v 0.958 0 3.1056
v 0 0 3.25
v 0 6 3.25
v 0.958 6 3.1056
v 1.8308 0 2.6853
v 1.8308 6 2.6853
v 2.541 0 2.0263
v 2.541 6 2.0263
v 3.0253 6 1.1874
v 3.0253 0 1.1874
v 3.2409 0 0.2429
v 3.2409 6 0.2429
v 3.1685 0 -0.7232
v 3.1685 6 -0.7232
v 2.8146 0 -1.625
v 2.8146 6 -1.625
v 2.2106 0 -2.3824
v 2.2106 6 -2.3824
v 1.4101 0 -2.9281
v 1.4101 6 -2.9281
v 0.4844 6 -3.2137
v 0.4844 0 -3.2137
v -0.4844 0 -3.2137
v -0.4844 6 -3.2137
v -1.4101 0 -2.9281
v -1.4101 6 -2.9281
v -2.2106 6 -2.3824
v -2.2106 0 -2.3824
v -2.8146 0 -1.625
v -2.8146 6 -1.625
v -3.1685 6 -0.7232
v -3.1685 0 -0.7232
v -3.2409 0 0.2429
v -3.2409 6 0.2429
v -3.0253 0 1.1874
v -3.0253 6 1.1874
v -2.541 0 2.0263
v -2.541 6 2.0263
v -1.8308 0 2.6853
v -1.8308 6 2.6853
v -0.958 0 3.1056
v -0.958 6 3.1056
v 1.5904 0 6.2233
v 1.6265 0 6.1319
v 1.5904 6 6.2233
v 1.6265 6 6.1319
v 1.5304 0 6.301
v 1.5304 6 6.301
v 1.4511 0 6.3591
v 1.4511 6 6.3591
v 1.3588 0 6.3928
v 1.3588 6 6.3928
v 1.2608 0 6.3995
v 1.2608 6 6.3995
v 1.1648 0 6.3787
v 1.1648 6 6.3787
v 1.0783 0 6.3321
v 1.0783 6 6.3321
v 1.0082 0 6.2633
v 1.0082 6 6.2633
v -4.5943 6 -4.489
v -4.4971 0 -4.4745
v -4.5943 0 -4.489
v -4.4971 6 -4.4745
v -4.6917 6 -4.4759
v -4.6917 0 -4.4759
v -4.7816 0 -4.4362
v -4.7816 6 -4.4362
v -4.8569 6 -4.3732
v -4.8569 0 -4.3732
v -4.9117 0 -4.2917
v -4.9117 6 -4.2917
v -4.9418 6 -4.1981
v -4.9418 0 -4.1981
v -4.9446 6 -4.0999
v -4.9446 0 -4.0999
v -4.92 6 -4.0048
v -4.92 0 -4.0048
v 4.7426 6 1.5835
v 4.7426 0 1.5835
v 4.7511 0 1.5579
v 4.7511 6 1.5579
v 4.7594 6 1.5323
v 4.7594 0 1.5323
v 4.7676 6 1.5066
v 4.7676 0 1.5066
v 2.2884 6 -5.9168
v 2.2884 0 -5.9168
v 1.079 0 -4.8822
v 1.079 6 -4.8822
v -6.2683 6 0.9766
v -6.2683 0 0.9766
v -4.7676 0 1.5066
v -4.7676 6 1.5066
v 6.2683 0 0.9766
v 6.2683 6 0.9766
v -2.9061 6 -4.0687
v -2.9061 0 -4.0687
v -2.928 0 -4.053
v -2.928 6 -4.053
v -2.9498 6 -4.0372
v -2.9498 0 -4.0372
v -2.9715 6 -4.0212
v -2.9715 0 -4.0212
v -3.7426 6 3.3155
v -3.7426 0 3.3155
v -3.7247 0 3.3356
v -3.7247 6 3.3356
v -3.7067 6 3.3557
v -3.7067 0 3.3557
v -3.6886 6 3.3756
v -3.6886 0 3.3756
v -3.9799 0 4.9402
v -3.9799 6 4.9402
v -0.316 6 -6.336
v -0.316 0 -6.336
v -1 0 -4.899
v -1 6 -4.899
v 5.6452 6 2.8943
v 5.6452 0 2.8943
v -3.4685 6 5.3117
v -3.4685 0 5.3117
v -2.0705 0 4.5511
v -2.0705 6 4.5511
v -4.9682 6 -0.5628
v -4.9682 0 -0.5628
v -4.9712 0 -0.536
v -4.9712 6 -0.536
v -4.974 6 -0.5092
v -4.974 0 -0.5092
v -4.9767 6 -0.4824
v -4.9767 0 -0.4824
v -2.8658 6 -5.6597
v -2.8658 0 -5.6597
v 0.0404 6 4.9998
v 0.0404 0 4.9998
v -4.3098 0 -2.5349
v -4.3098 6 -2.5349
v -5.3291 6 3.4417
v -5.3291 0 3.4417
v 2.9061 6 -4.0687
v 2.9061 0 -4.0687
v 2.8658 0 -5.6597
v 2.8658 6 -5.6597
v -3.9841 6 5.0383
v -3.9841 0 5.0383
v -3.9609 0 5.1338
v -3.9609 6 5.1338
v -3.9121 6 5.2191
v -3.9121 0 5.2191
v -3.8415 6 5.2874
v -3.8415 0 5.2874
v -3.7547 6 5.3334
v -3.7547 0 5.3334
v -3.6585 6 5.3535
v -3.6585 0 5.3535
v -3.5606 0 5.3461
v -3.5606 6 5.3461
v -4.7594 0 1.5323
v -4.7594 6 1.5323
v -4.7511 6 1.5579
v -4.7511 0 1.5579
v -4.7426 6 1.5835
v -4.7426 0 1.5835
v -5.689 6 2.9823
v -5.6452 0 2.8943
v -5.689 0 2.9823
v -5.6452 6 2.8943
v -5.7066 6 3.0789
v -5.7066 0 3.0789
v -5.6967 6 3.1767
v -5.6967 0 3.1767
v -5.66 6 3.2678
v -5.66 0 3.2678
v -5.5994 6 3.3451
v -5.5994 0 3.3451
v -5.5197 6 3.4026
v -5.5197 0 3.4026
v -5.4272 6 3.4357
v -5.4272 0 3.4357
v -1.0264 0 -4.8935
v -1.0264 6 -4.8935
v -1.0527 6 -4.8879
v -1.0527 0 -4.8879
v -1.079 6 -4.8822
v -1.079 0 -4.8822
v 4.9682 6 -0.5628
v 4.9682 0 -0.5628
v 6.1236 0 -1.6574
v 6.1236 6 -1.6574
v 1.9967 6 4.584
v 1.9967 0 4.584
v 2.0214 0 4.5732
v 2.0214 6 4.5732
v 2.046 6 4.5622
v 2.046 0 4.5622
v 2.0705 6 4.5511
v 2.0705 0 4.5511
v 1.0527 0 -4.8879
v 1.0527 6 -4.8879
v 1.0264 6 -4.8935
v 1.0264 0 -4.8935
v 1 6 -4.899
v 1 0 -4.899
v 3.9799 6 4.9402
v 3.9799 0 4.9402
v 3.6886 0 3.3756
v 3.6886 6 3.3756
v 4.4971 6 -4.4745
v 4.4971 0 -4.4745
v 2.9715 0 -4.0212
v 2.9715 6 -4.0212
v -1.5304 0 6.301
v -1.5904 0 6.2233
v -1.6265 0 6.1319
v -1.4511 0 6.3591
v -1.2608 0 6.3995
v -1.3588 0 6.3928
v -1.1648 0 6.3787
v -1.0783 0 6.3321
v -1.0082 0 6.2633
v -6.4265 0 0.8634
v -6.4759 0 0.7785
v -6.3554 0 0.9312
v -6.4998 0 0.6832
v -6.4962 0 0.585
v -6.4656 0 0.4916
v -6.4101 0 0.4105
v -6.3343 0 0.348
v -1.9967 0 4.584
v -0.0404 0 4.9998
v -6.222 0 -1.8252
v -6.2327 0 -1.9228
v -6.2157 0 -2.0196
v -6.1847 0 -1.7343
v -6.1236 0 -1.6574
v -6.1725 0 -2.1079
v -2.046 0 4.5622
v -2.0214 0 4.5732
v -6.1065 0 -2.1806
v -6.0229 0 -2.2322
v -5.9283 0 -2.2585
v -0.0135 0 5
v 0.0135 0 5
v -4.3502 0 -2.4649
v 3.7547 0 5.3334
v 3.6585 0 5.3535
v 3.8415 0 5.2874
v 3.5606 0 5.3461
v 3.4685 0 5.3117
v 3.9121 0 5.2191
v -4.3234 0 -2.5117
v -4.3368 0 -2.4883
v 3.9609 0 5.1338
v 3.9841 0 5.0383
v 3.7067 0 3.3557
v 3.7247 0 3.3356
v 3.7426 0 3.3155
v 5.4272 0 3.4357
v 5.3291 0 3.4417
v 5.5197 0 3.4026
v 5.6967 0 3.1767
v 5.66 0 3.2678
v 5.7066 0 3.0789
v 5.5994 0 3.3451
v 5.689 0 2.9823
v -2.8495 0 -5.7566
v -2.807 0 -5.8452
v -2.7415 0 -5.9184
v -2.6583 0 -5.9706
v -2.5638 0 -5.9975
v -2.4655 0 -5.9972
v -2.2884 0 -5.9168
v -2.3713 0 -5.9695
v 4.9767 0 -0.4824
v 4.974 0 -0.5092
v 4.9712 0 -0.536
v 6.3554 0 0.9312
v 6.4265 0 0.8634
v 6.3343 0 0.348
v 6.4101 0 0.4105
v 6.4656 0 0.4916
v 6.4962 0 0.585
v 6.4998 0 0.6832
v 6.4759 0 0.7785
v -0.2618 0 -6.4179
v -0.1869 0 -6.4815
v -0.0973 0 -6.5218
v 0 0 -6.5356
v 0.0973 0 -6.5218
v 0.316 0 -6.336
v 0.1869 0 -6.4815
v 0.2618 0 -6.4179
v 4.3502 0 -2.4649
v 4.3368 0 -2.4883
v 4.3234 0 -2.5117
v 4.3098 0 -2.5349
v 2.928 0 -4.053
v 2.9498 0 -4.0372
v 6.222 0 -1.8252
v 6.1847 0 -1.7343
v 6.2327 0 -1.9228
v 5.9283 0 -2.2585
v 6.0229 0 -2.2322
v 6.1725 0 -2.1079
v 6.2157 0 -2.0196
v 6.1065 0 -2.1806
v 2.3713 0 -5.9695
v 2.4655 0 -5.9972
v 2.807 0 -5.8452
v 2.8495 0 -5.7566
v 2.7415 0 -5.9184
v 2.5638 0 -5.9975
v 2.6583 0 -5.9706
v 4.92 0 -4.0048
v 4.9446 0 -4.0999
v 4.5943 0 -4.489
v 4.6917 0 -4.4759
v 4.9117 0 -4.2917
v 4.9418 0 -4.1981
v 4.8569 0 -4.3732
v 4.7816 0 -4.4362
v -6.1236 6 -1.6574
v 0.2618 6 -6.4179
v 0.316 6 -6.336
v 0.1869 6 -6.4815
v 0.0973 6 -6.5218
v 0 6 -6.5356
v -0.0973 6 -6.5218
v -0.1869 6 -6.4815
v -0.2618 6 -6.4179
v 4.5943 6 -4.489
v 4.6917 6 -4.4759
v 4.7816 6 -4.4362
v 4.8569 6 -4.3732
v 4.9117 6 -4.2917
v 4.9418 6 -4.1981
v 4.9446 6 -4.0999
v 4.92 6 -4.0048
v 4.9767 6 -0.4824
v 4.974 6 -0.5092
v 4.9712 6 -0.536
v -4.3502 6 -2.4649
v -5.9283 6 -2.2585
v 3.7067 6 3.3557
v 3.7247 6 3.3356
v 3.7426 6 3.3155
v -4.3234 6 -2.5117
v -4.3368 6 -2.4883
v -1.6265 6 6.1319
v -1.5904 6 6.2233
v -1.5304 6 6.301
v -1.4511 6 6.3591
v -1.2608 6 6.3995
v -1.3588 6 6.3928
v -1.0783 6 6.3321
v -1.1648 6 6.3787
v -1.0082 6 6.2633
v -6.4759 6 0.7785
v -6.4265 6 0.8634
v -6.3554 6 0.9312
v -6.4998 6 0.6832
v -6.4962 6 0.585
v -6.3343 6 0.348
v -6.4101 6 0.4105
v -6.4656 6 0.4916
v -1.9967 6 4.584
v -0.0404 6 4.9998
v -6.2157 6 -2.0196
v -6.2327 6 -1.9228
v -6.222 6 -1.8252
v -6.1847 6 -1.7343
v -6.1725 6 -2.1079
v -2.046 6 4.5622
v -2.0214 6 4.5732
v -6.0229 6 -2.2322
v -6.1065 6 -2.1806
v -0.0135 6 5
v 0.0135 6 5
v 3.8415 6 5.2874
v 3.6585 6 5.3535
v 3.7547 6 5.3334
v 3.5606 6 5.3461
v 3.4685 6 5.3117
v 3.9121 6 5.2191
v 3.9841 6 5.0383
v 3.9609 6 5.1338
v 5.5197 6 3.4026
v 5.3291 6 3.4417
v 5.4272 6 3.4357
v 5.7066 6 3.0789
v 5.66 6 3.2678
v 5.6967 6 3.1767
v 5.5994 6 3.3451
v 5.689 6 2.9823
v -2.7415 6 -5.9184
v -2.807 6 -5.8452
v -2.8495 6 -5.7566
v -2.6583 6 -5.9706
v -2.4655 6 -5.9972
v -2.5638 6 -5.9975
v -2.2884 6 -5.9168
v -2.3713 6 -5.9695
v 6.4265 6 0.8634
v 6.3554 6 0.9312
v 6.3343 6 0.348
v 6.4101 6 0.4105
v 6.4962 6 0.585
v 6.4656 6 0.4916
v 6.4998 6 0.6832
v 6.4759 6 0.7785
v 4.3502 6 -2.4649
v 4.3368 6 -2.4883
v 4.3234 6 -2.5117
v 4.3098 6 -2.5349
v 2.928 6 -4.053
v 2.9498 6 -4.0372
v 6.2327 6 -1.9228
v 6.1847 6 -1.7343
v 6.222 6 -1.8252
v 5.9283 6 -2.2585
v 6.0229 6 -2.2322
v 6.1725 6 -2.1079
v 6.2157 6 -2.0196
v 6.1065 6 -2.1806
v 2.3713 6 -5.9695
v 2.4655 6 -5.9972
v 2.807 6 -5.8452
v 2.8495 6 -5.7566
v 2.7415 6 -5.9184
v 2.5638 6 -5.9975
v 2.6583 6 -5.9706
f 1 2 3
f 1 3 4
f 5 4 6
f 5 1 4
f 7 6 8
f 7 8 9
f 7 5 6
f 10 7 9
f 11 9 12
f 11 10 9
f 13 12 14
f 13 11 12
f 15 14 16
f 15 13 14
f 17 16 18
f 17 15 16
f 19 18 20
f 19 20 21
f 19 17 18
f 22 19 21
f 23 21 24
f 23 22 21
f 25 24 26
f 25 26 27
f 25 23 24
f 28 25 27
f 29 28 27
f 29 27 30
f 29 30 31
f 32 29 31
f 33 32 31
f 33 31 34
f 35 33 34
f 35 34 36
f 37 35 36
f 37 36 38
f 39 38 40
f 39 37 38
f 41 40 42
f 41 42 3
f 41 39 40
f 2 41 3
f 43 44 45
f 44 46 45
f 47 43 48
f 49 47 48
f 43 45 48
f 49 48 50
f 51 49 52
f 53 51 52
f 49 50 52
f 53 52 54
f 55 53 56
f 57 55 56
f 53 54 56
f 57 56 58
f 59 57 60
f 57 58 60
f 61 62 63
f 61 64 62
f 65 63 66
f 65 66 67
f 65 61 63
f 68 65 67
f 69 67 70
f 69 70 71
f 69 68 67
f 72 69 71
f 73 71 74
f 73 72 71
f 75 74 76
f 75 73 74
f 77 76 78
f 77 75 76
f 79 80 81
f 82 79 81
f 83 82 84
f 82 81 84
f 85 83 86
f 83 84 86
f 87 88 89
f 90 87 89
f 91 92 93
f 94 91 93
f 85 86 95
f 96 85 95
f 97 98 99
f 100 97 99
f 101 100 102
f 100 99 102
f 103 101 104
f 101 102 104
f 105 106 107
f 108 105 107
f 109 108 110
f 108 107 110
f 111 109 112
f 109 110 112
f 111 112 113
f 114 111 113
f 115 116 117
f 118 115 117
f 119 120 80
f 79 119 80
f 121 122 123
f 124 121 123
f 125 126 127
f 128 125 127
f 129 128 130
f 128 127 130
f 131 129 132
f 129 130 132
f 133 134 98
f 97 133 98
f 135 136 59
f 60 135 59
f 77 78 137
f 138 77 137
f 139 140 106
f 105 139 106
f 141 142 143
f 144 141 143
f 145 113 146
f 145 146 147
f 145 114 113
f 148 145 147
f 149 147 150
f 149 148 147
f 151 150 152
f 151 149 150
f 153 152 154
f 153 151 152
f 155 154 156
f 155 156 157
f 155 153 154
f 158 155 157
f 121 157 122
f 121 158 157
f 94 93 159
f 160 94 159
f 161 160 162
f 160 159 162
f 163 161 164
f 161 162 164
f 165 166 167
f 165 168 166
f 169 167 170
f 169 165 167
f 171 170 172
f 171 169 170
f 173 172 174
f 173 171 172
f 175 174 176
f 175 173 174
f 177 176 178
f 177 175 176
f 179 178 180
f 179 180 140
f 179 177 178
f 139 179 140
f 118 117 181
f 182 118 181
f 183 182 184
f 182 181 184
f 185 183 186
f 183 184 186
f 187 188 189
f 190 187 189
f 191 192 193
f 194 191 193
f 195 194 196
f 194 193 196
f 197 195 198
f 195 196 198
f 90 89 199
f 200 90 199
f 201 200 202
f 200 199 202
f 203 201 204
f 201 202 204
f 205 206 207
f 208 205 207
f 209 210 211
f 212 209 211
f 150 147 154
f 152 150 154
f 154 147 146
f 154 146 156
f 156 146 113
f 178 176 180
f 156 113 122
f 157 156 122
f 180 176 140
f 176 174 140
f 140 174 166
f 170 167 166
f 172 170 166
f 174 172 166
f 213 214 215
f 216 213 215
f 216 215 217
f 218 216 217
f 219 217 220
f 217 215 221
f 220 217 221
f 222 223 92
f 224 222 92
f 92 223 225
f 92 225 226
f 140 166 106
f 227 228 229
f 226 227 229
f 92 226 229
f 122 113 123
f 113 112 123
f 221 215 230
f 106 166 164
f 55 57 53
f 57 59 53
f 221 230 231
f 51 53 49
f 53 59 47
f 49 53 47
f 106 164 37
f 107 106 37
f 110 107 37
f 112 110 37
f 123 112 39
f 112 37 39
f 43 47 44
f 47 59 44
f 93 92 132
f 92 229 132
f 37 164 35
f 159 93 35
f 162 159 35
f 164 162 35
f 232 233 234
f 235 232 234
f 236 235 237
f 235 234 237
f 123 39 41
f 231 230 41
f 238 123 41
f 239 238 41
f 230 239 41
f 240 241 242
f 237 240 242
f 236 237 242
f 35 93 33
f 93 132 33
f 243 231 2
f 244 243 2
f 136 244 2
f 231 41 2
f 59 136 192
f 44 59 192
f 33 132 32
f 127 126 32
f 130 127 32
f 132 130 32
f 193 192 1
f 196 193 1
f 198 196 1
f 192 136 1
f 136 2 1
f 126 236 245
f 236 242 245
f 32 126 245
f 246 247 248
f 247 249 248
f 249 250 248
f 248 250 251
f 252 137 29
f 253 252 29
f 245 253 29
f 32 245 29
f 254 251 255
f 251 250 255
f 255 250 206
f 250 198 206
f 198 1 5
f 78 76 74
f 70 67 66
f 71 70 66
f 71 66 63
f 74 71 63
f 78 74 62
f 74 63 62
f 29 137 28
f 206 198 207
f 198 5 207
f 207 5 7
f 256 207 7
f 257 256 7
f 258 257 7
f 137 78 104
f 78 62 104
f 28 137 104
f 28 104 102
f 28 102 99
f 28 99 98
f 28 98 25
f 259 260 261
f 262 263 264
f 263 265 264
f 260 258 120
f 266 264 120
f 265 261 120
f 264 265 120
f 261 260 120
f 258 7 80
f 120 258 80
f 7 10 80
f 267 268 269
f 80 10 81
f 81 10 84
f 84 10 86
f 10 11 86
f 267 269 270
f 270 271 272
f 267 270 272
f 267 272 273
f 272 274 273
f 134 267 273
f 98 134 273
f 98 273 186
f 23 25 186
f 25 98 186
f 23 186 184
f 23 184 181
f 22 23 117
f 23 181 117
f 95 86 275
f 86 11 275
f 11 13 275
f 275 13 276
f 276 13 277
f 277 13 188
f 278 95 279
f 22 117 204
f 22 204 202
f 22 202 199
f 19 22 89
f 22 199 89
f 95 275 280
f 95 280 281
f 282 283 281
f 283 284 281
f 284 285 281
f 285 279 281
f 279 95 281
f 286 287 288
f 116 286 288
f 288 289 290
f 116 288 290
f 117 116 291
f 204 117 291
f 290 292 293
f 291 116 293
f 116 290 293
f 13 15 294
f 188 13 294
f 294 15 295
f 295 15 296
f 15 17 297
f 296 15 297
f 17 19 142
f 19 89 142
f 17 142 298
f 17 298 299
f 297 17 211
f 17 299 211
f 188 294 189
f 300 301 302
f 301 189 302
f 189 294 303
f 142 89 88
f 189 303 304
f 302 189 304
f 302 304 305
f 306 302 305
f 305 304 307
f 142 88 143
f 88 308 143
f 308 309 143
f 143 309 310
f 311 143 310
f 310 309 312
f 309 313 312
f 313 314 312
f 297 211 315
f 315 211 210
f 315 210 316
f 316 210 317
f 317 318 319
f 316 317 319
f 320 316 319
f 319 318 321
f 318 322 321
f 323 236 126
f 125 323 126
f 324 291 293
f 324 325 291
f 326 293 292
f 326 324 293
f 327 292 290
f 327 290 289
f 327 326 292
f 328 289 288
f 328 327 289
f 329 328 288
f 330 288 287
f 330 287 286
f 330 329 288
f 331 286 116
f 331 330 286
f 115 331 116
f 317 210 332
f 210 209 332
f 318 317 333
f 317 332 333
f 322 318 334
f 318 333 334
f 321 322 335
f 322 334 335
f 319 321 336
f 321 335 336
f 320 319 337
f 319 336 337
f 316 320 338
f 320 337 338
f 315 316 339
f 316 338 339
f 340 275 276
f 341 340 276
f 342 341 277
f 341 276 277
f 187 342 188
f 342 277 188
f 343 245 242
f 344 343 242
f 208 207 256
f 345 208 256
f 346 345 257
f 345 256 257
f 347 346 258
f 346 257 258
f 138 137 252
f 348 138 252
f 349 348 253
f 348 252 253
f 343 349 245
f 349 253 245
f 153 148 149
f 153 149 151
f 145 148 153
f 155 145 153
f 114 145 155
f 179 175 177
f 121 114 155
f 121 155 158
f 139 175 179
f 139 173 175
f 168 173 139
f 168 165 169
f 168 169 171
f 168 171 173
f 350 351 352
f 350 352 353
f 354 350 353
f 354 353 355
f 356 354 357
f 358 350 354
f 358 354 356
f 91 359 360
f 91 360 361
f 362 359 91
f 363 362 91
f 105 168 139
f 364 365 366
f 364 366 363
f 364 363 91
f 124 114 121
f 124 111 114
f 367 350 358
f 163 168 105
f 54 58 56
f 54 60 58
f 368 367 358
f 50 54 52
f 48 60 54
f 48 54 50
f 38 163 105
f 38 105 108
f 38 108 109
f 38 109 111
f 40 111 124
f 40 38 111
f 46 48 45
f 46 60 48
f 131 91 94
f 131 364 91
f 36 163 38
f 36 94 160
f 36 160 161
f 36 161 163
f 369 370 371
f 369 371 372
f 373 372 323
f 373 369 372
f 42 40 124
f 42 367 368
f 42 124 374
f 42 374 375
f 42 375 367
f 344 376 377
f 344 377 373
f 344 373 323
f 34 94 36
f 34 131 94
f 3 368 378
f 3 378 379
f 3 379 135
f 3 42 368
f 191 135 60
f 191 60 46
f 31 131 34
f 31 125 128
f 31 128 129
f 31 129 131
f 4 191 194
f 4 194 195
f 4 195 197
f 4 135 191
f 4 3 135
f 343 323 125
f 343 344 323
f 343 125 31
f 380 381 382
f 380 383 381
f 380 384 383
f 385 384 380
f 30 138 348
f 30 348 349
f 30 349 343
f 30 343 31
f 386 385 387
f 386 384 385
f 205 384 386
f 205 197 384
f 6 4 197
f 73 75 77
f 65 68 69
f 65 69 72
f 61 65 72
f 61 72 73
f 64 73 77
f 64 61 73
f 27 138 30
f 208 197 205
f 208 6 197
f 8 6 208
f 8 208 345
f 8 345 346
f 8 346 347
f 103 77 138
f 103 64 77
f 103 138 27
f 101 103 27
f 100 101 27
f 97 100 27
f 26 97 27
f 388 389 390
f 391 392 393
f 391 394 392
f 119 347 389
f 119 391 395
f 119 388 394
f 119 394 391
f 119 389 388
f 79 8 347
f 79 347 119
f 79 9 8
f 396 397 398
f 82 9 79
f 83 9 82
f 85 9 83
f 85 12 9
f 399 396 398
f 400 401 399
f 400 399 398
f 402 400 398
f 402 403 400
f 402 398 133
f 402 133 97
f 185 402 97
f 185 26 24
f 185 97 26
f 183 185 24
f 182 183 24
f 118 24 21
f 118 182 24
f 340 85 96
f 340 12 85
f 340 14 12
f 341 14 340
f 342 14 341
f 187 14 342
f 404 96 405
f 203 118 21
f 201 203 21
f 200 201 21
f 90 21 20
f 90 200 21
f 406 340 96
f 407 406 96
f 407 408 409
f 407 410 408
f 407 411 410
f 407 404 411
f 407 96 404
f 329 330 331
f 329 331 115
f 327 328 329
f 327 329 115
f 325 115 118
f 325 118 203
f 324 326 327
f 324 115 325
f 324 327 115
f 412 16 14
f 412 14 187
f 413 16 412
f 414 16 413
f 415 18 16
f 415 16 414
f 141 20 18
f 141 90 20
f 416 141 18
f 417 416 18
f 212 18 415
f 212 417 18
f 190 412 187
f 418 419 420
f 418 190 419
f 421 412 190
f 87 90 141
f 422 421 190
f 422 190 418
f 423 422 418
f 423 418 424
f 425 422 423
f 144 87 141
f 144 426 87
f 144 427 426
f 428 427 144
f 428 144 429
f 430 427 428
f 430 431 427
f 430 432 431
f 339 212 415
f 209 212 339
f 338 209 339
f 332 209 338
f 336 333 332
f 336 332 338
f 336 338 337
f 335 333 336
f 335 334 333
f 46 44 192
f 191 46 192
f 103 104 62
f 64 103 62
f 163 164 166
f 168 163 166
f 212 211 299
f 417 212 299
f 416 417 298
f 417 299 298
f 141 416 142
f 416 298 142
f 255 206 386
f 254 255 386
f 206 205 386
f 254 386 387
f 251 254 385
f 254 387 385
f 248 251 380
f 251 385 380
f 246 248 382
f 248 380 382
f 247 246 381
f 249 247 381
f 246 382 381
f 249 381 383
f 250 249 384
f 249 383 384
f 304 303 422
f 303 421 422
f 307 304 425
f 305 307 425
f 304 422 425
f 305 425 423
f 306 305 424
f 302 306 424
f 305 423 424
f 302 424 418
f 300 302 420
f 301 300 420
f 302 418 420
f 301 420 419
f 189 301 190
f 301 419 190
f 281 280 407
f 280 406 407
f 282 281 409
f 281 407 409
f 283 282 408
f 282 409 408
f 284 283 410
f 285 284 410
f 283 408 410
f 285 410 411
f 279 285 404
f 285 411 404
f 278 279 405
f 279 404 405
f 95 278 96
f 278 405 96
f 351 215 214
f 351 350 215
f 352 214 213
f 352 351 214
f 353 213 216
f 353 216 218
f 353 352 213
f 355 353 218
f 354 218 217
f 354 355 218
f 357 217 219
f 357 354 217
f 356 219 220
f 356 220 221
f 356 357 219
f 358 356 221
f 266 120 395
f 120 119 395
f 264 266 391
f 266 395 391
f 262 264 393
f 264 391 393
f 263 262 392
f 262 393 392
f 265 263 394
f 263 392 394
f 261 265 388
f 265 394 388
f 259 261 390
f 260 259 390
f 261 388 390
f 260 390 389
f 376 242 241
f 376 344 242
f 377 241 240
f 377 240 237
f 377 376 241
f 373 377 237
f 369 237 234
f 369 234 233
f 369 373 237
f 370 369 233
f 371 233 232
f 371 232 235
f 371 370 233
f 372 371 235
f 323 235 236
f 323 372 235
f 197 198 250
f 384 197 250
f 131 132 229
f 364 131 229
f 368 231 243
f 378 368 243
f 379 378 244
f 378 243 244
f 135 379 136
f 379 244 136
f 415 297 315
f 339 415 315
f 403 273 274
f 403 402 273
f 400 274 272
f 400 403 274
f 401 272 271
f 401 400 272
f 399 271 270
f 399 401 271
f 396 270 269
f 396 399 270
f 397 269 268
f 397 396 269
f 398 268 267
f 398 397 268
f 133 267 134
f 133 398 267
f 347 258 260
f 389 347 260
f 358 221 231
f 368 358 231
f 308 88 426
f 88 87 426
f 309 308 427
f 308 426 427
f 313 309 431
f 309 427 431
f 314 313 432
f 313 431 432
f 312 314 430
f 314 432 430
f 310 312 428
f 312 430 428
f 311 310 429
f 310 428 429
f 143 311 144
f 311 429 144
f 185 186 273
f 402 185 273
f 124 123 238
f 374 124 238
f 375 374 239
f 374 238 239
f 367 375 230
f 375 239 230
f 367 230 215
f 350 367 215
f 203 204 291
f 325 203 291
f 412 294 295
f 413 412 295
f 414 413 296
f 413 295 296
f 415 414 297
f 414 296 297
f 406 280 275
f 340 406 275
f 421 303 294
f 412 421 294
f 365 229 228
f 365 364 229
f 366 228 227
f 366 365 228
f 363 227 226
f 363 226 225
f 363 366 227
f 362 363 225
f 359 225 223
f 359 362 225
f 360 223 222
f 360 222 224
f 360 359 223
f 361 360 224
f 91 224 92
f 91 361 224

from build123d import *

# Parameters (mm, degrees)
SKETCH1_R           = 3.25
BOSS_EXTRUDE2_DEPTH = 6
FILLET1_R           = 0.35


with BuildPart() as part:
    # Sketch1 → Boss-Extrude2 (new body)
    with BuildSketch(Plane(origin=(0, 0, 0), x_dir=(1, 0, 0), z_dir=(0, 1, 0))):
        with BuildLine():
            Line((1, 4.898979486), (0, 7))
            Line((0, 7), (-1, 4.898979486))
            ThreePointArc((-1, 4.898979486), (-1.039558454, 4.890738004), (-1.079049013, 4.882177099))
            Line((-1.079049013, 4.882177099), (-2.847156502, 6.394818203))
            Line((-2.847156502, 6.394818203), (-2.906139928, 4.068703813))
            ThreePointArc((-2.906139928, 4.068703813), (-2.938926261, 4.045084972), (-2.971520648, 4.021201939))
            Line((-2.971520648, 4.021201939), (-5.202013778, 4.683914245))
            Line((-5.202013778, 4.683914245), (-4.309781861, 2.534912288))
            ThreePointArc((-4.309781861, 2.534912288), (-4.330127019, 2.5), (-4.350189369, 2.464924432))
            Line((-4.350189369, 2.464924432), (-6.657395614, 2.163118961))
            Line((-6.657395614, 2.163118961), (-4.968223357, 0.5628114))
            ThreePointArc((-4.968223357, 0.5628114), (-4.972609477, 0.522642316), (-4.976670827, 0.482439098))
            Line((-4.976670827, 0.482439098), (-6.961653268, -0.731699243))
            Line((-6.961653268, -0.731699243), (-4.7676139, -1.506604693))
            ThreePointArc((-4.7676139, -1.506604693), (-4.755282581, -1.545084972), (-4.742640687, -1.583464339))
            Line((-4.742640687, -1.583464339), (-6.062177826, -3.5))
            Line((-6.062177826, -3.5), (-3.742640687, -3.315515147))
            ThreePointArc((-3.742640687, -3.315515147), (-3.715724127, -3.345653032), (-3.688564887, -3.375572407))
            Line((-3.688564887, -3.375572407), (-4.114496766, -5.663118961))
            Line((-4.114496766, -5.663118961), (-2.070530899, -4.551142911))
            ThreePointArc((-2.070530899, -4.551142911), (-2.033683215, -4.567727288), (-1.996702709, -4.584013339))
            Line((-1.996702709, -4.584013339), (-1.455381836, -6.847033205))
            Line((-1.455381836, -6.847033205), (-0.040407507, -4.999836721))
            ThreePointArc((-0.040407507, -4.999836721), (0, -5), (0.040407507, -4.999836721))
            Line((0.040407507, -4.999836721), (1.455381836, -6.847033205))
            Line((1.455381836, -6.847033205), (1.996702709, -4.584013339))
            ThreePointArc((1.996702709, -4.584013339), (2.033683215, -4.567727288), (2.070530899, -4.551142911))
            Line((2.070530899, -4.551142911), (4.114496766, -5.663118961))
            Line((4.114496766, -5.663118961), (3.688564887, -3.375572407))
            ThreePointArc((3.688564887, -3.375572407), (3.715724127, -3.345653032), (3.742640687, -3.315515147))
            Line((3.742640687, -3.315515147), (6.062177826, -3.5))
            Line((6.062177826, -3.5), (4.742640687, -1.583464339))
            ThreePointArc((4.742640687, -1.583464339), (4.755282581, -1.545084972), (4.7676139, -1.506604693))
            Line((4.7676139, -1.506604693), (6.961653268, -0.731699243))
            Line((6.961653268, -0.731699243), (4.976670827, 0.482439098))
            ThreePointArc((4.976670827, 0.482439098), (4.972609477, 0.522642316), (4.968223357, 0.5628114))
            Line((4.968223357, 0.5628114), (6.657395614, 2.163118961))
            Line((6.657395614, 2.163118961), (4.350189369, 2.464924432))
            ThreePointArc((4.350189369, 2.464924432), (4.330127019, 2.5), (4.309781861, 2.534912288))
            Line((4.309781861, 2.534912288), (5.202013778, 4.683914245))
            Line((5.202013778, 4.683914245), (2.971520648, 4.021201939))
            ThreePointArc((2.971520648, 4.021201939), (2.938926261, 4.045084972), (2.906139928, 4.068703813))
            Line((2.906139928, 4.068703813), (2.847156502, 6.394818203))
            Line((2.847156502, 6.394818203), (1.079049013, 4.882177099))
            ThreePointArc((1.079049013, 4.882177099), (1.039558454, 4.890738004), (1, 4.898979486))
        make_face()
        with Locations(Location((0, 0, 0), (0, 0, 270))):
            Circle(SKETCH1_R, mode=Mode.SUBTRACT)
    extrude(amount=BOSS_EXTRUDE2_DEPTH)

    # Fillet1
    fillet1_edges = [part.edges().sort_by_distance(p)[0] for p in [
        (2.847156502, 3, -6.394818203),
        (5.202013778, 3, -4.683914245),
        (6.657395614, 3, -2.163118961),
        (6.961653268, 3, 0.731699243),
        (6.062177826, 3, 3.5),
        (4.114496766, 3, 5.663118961),
        (1.455381836, 3, 6.847033205),
        (-1.455381836, 3, 6.847033205),
        (-4.114496766, 3, 5.663118961),
        (-6.062177826, 3, 3.5),
        (-6.961653268, 3, 0.731699243),
        (-6.657395614, 3, -2.163118961),
        (-5.202013778, 3, -4.683914245),
        (-2.847156502, 3, -6.394818203),
        (0, 3, -7),
    ]]
    fillet(fillet1_edges, radius=FILLET1_R)


solid = part.part
